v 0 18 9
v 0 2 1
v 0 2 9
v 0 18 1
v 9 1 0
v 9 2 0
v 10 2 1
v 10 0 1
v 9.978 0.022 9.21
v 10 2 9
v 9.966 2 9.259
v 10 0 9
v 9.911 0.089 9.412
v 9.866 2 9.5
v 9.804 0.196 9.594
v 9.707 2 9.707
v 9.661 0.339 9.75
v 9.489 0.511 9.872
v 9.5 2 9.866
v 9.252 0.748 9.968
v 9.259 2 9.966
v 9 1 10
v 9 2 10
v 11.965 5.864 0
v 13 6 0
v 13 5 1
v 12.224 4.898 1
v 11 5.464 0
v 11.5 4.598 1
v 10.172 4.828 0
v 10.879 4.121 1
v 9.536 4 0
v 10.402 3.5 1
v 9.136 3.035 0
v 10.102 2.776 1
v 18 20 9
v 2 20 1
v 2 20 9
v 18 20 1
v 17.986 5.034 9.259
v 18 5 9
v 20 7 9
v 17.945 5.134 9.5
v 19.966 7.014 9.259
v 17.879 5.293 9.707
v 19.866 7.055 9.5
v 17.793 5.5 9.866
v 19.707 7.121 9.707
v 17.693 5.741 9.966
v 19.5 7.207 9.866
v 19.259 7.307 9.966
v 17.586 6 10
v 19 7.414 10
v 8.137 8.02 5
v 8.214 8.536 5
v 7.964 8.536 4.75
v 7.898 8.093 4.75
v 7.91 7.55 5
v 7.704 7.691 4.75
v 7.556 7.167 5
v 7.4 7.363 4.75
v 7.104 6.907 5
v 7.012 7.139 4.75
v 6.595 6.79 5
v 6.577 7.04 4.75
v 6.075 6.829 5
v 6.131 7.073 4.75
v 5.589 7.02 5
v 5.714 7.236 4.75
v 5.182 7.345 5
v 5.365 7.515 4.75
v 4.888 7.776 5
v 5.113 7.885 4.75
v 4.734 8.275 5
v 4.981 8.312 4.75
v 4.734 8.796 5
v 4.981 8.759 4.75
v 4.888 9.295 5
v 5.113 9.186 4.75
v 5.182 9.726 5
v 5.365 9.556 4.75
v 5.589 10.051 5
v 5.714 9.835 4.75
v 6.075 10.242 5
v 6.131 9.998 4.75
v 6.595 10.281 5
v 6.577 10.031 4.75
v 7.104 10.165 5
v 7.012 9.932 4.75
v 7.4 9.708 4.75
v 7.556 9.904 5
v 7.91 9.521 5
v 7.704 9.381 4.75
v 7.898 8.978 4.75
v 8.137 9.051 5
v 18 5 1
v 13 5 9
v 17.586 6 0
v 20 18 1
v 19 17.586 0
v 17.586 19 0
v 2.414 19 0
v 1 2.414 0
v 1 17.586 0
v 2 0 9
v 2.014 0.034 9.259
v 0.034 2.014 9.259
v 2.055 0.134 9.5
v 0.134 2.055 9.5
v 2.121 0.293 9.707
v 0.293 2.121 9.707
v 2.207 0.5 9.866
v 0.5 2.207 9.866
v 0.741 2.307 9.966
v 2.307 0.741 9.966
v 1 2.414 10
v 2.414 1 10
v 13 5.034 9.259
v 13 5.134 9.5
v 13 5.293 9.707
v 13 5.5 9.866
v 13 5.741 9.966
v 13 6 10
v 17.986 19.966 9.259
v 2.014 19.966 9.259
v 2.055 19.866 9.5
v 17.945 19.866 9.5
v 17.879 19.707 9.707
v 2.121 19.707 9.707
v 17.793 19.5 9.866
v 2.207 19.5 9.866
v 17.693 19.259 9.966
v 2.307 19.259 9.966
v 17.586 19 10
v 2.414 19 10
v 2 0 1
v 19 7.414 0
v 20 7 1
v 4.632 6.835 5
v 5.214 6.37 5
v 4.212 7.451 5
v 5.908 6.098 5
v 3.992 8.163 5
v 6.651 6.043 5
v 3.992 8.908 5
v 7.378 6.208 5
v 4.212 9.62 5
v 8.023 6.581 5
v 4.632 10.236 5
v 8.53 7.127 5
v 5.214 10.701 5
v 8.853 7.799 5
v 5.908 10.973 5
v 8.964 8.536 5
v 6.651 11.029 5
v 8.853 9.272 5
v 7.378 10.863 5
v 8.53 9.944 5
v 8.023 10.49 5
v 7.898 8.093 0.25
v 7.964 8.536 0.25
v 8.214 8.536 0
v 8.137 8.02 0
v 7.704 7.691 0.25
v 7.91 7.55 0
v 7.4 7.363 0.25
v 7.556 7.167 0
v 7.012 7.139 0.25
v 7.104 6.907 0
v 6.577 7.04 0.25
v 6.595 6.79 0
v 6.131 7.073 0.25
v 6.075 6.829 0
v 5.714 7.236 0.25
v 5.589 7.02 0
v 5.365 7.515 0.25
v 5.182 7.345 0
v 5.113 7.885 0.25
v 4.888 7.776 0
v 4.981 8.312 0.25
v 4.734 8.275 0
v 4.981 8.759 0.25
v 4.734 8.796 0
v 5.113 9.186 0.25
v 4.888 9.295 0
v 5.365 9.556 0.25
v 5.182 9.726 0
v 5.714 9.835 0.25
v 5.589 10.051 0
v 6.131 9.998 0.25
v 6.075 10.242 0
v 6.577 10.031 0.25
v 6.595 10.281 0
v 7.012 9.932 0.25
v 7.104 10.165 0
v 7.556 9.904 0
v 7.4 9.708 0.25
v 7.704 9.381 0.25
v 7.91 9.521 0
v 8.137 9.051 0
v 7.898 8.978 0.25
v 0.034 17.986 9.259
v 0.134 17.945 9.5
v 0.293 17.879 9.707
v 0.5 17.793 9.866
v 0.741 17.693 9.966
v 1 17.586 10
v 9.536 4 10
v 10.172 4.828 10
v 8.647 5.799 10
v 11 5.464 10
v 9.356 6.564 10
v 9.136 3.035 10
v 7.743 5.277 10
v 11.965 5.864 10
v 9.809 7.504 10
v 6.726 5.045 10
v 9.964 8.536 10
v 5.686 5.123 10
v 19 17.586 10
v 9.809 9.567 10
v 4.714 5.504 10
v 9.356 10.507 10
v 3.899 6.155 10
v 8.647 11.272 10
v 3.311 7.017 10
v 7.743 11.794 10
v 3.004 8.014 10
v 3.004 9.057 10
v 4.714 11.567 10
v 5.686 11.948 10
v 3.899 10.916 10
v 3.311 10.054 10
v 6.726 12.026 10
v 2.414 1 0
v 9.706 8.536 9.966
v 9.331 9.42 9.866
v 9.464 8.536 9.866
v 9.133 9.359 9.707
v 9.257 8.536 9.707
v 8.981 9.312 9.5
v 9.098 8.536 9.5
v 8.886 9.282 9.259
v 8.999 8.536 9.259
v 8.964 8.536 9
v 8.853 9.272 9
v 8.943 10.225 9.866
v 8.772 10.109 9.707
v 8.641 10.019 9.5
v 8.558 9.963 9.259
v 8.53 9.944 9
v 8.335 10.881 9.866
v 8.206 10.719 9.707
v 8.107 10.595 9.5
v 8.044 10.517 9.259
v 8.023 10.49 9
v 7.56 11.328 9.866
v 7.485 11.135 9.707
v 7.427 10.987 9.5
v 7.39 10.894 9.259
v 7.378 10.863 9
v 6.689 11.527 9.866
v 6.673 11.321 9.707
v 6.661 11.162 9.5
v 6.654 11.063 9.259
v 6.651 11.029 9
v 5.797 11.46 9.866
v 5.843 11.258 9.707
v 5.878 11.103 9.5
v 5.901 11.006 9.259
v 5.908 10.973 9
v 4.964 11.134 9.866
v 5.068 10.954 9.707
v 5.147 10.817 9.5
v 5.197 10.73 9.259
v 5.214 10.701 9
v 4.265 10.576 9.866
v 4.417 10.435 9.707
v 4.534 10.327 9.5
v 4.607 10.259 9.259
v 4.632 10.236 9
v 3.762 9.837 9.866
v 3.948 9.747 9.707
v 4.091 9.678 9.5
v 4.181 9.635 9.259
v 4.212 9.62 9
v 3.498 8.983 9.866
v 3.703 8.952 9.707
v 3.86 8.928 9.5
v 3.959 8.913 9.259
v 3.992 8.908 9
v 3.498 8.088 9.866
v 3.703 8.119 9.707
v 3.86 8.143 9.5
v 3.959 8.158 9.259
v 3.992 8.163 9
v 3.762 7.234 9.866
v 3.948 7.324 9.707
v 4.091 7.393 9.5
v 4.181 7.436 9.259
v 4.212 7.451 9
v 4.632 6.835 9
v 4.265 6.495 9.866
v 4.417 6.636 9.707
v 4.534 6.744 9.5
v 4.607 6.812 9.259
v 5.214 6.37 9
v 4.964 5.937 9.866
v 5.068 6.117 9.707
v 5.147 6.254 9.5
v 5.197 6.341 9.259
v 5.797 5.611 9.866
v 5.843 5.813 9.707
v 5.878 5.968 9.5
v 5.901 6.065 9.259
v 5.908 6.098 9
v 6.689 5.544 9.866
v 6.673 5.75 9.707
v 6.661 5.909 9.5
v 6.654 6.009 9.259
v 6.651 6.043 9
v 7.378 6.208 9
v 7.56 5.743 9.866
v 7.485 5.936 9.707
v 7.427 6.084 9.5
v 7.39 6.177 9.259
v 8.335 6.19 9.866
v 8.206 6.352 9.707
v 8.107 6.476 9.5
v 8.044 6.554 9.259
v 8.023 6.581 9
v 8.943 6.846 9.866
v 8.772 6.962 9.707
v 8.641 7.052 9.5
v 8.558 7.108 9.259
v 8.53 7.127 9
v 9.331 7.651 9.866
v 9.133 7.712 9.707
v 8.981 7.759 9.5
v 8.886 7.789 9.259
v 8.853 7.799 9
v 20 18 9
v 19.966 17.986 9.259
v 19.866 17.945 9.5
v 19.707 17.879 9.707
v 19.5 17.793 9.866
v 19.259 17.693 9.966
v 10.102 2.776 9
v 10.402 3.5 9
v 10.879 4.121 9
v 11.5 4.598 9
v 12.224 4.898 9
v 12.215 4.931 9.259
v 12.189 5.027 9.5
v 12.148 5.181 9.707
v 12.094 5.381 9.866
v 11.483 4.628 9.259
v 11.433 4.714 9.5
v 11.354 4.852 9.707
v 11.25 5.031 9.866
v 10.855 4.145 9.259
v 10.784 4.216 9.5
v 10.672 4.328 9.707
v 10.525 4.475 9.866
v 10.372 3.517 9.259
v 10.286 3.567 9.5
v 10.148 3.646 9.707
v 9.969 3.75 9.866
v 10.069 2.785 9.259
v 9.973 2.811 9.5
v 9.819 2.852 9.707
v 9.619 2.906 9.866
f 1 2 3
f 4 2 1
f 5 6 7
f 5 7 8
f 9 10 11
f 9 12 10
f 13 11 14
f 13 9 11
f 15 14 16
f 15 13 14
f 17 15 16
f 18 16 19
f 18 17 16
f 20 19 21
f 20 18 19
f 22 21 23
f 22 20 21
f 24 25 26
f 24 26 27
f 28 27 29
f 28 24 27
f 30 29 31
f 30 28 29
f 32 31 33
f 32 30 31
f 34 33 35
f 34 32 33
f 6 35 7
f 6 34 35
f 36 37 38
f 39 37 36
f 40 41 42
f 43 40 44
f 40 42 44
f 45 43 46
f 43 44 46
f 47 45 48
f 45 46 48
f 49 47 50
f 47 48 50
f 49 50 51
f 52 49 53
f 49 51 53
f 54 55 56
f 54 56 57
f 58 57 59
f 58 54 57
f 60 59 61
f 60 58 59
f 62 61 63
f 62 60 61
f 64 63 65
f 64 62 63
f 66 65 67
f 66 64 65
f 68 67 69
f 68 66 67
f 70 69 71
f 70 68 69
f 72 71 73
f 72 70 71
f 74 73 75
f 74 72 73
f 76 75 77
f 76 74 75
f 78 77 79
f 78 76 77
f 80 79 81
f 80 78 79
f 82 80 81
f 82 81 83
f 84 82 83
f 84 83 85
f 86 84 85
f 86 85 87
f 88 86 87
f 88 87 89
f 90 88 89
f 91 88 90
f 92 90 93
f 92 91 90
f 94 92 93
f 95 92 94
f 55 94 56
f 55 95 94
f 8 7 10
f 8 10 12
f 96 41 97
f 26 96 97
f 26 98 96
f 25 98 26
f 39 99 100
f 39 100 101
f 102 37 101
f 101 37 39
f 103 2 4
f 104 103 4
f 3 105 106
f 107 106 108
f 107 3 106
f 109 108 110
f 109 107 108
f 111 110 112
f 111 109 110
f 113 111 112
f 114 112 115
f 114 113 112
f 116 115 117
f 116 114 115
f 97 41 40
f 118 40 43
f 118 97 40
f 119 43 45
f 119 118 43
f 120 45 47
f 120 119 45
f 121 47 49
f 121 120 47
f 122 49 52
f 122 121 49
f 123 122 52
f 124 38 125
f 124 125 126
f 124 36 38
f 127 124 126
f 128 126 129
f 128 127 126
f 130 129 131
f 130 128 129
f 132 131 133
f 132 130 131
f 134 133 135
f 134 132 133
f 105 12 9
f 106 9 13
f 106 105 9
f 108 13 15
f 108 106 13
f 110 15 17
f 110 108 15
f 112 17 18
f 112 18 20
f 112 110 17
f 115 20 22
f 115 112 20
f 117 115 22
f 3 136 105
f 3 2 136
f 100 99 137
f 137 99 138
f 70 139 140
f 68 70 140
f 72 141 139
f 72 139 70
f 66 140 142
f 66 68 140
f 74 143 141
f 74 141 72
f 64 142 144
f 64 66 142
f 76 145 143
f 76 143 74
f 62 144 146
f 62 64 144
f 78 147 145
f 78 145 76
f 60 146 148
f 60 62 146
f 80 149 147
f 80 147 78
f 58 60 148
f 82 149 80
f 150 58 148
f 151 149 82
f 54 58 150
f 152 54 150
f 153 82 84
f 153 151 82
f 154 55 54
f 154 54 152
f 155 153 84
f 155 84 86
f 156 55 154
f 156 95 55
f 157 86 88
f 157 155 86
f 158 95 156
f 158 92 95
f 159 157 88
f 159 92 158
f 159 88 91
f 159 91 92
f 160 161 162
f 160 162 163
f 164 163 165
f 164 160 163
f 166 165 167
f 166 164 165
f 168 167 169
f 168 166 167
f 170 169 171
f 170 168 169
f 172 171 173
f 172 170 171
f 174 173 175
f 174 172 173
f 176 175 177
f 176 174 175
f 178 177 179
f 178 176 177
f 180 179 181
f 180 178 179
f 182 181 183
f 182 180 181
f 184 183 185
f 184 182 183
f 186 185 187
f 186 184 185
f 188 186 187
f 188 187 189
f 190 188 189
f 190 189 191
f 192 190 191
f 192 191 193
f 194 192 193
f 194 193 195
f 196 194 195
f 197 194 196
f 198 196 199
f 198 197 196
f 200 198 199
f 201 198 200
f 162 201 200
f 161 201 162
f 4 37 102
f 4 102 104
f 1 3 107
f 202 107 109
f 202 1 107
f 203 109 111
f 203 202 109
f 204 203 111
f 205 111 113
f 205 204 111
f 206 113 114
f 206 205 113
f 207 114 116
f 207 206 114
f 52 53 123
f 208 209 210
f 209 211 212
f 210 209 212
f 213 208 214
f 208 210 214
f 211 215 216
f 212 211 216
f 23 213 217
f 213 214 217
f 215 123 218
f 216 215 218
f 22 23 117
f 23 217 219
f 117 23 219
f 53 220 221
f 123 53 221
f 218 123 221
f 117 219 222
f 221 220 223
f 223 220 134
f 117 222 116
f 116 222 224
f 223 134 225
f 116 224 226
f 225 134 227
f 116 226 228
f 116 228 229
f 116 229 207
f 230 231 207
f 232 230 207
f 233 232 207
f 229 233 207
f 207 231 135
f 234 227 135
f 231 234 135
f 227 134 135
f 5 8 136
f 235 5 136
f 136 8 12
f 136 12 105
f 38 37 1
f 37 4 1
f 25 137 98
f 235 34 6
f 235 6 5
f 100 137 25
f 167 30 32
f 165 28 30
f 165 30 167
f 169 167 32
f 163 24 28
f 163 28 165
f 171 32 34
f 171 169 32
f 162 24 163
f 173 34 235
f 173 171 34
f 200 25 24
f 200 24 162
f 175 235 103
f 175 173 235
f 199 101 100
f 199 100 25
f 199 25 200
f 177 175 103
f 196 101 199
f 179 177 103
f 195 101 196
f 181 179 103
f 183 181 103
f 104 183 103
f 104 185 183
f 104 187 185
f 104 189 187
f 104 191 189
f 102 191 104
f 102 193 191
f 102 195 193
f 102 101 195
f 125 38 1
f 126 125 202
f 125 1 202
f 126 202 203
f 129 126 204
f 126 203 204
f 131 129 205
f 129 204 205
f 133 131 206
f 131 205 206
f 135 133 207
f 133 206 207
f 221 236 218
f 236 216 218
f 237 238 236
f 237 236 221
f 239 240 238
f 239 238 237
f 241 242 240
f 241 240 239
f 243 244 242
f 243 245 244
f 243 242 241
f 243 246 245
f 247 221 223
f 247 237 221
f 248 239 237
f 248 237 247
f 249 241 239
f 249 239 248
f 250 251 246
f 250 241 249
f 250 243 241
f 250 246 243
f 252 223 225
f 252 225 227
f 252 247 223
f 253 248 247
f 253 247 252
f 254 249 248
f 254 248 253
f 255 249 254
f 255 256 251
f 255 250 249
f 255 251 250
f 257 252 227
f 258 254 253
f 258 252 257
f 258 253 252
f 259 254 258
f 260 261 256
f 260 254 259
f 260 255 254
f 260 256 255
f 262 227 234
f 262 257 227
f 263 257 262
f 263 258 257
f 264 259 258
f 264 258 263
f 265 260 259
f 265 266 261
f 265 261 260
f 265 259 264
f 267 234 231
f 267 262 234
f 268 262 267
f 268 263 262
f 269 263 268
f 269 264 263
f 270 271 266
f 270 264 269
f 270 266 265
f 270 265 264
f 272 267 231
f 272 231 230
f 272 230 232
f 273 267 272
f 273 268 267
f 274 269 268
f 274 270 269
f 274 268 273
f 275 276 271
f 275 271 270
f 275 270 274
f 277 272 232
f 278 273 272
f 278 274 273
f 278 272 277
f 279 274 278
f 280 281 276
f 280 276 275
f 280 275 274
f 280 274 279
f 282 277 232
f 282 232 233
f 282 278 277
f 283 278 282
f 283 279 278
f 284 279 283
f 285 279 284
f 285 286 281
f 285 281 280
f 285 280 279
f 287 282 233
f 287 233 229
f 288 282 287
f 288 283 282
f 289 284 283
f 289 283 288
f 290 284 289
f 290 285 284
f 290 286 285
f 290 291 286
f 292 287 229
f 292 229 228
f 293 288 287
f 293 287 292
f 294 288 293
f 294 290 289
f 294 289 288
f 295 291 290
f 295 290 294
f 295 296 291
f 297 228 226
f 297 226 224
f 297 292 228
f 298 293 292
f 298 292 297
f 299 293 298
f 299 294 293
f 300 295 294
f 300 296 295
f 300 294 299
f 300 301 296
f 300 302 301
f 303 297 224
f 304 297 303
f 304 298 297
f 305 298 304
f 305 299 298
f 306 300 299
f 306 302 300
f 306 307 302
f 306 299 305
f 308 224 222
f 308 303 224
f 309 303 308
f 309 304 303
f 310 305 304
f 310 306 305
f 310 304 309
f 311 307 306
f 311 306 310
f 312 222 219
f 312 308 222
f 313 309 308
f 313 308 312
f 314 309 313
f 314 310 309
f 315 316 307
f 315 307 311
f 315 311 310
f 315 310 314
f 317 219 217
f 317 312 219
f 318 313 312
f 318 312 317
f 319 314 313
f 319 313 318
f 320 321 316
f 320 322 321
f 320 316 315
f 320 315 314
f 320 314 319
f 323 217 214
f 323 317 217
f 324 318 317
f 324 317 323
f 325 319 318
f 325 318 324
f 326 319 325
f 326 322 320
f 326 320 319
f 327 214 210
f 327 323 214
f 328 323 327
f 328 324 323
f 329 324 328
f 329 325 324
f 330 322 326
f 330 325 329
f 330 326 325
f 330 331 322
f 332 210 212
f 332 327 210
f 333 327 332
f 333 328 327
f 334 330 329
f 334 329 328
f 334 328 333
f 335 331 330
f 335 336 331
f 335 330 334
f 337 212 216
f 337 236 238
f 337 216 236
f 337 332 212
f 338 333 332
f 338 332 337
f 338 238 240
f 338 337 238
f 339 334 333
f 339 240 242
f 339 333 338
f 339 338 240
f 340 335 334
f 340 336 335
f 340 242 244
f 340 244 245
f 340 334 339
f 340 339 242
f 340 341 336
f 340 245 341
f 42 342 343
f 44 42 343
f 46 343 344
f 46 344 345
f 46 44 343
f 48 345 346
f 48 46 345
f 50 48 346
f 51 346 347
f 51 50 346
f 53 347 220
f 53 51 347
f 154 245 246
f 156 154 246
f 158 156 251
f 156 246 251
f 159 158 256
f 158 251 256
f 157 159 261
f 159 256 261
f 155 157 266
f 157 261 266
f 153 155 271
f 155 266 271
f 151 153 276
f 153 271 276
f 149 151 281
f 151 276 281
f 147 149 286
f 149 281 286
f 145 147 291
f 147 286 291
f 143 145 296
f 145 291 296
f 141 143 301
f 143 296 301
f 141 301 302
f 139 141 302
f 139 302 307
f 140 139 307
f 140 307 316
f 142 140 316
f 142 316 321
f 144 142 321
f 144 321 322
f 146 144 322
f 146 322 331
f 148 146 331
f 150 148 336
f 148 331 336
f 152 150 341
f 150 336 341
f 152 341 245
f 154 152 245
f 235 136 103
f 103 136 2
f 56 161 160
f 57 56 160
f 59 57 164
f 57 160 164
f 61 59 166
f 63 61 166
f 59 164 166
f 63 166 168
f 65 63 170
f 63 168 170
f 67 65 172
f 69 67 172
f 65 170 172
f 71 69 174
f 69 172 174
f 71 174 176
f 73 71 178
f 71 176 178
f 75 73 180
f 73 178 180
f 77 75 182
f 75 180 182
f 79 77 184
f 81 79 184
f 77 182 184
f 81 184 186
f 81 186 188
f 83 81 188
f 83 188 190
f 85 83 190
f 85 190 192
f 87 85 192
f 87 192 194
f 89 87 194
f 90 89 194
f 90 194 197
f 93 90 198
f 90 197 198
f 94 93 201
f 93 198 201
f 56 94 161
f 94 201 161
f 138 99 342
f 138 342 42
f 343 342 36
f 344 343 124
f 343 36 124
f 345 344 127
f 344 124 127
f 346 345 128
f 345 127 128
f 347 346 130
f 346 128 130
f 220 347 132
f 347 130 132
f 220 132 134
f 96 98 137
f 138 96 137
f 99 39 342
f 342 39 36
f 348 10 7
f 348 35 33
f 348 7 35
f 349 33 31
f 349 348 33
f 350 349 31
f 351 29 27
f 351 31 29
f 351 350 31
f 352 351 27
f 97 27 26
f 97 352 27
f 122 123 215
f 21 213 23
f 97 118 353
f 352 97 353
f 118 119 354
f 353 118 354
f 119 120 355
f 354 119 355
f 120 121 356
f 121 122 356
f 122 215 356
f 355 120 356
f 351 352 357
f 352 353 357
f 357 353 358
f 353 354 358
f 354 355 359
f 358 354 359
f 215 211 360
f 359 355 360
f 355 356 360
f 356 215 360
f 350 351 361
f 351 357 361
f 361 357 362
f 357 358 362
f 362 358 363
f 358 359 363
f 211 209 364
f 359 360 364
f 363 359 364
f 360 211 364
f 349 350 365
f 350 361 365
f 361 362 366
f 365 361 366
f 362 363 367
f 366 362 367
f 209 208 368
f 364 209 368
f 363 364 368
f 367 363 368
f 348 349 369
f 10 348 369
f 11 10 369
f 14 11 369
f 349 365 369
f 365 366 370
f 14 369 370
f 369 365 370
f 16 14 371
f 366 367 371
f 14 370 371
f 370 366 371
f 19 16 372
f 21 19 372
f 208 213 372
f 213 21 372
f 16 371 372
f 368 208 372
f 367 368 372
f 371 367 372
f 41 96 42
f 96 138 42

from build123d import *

# Parameters (mm, degrees)
PAD_DEPTH       = 10
SKETCH001_R     = 2.5
POCKET_DEPTH    = 5
FILLET_R        = 3
CHAMFER_SIZE    = 2
FILLET001_R     = 1
CHAMFER001_SIZE = 1
SKETCH003_R     = 1.5
POCKET001_DEPTH = 5
CHAMFER002_SIZE = 0.25


with BuildPart() as part:
    # Sketch → Pad (new body)
    with BuildSketch(Plane.XY):
        Polygon((0, 0), (0, 20), (20, 20), (20, 5), (10, 5), (10, 0), align=None)
    extrude(amount=PAD_DEPTH)

    # Sketch001 (on Face8 of Pad) → Pocket (cut)
    with BuildSketch(Plane.XY.offset(10)):
        with Locations((6.464466, 8.535534)):
            Circle(SKETCH001_R)
    extrude(amount=-POCKET_DEPTH, mode=Mode.SUBTRACT)

    # Fillet
    fillet_edges = [part.edges().sort_by_distance(p)[0] for p in [
        (10, 5, 5),
    ]]
    fillet(fillet_edges, radius=FILLET_R)

    # Chamfer
    chamfer_edges = [part.edges().sort_by_distance(p)[0] for p in [
        (0, 0, 5),
        (20, 5, 5),
        (20, 20, 5),
        (0, 20, 5),
    ]]
    chamfer(chamfer_edges, length=CHAMFER_SIZE)

    # Fillet001
    fillet001_edges = [part.edges().sort_by_distance(p)[0] for p in [
        (6, 0, 10),
        (1, 1, 10),
        (10, 1, 10),
        (0, 10, 10),
        (10.87868, 4.12132, 10),
        (1, 19, 10),
        (15.5, 5, 10),
        (10, 20, 10),
        (19, 6, 10),
        (19, 19, 10),
        (20, 12.5, 10),
        (3.964466, 8.535534, 10),
    ]]
    fillet(fillet001_edges, radius=FILLET001_R)

    # Chamfer001
    chamfer001_edges = [part.edges().sort_by_distance(p)[0] for p in [
        (15.5, 5, 0),
        (19, 6, 0),
        (10.87868, 4.12132, 0),
        (20, 12.5, 0),
        (10, 1, 0),
        (19, 19, 0),
        (6, 0, 0),
        (10, 20, 0),
        (1, 1, 0),
        (1, 19, 0),
        (0, 10, 0),
    ]]
    chamfer(chamfer001_edges, length=CHAMFER001_SIZE)

    # Sketch003 (on Face9 of Chamfer001) → Pocket001 (cut)
    with BuildSketch(Plane(origin=(0, 0, 0), x_dir=(1, 0, 0), z_dir=(0, 0, -1))):
        with Locations((6.464466, -8.535534)):
            Circle(SKETCH003_R)
    extrude(amount=-POCKET001_DEPTH, mode=Mode.SUBTRACT)

    # Chamfer002
    chamfer002_edges = [part.edges().sort_by_distance(p)[0] for p in [
        (4.964466, 8.535534, 0),
        (4.964466, 8.535534, 5),
    ]]
    chamfer(chamfer002_edges, length=CHAMFER002_SIZE)


solid = part.part
